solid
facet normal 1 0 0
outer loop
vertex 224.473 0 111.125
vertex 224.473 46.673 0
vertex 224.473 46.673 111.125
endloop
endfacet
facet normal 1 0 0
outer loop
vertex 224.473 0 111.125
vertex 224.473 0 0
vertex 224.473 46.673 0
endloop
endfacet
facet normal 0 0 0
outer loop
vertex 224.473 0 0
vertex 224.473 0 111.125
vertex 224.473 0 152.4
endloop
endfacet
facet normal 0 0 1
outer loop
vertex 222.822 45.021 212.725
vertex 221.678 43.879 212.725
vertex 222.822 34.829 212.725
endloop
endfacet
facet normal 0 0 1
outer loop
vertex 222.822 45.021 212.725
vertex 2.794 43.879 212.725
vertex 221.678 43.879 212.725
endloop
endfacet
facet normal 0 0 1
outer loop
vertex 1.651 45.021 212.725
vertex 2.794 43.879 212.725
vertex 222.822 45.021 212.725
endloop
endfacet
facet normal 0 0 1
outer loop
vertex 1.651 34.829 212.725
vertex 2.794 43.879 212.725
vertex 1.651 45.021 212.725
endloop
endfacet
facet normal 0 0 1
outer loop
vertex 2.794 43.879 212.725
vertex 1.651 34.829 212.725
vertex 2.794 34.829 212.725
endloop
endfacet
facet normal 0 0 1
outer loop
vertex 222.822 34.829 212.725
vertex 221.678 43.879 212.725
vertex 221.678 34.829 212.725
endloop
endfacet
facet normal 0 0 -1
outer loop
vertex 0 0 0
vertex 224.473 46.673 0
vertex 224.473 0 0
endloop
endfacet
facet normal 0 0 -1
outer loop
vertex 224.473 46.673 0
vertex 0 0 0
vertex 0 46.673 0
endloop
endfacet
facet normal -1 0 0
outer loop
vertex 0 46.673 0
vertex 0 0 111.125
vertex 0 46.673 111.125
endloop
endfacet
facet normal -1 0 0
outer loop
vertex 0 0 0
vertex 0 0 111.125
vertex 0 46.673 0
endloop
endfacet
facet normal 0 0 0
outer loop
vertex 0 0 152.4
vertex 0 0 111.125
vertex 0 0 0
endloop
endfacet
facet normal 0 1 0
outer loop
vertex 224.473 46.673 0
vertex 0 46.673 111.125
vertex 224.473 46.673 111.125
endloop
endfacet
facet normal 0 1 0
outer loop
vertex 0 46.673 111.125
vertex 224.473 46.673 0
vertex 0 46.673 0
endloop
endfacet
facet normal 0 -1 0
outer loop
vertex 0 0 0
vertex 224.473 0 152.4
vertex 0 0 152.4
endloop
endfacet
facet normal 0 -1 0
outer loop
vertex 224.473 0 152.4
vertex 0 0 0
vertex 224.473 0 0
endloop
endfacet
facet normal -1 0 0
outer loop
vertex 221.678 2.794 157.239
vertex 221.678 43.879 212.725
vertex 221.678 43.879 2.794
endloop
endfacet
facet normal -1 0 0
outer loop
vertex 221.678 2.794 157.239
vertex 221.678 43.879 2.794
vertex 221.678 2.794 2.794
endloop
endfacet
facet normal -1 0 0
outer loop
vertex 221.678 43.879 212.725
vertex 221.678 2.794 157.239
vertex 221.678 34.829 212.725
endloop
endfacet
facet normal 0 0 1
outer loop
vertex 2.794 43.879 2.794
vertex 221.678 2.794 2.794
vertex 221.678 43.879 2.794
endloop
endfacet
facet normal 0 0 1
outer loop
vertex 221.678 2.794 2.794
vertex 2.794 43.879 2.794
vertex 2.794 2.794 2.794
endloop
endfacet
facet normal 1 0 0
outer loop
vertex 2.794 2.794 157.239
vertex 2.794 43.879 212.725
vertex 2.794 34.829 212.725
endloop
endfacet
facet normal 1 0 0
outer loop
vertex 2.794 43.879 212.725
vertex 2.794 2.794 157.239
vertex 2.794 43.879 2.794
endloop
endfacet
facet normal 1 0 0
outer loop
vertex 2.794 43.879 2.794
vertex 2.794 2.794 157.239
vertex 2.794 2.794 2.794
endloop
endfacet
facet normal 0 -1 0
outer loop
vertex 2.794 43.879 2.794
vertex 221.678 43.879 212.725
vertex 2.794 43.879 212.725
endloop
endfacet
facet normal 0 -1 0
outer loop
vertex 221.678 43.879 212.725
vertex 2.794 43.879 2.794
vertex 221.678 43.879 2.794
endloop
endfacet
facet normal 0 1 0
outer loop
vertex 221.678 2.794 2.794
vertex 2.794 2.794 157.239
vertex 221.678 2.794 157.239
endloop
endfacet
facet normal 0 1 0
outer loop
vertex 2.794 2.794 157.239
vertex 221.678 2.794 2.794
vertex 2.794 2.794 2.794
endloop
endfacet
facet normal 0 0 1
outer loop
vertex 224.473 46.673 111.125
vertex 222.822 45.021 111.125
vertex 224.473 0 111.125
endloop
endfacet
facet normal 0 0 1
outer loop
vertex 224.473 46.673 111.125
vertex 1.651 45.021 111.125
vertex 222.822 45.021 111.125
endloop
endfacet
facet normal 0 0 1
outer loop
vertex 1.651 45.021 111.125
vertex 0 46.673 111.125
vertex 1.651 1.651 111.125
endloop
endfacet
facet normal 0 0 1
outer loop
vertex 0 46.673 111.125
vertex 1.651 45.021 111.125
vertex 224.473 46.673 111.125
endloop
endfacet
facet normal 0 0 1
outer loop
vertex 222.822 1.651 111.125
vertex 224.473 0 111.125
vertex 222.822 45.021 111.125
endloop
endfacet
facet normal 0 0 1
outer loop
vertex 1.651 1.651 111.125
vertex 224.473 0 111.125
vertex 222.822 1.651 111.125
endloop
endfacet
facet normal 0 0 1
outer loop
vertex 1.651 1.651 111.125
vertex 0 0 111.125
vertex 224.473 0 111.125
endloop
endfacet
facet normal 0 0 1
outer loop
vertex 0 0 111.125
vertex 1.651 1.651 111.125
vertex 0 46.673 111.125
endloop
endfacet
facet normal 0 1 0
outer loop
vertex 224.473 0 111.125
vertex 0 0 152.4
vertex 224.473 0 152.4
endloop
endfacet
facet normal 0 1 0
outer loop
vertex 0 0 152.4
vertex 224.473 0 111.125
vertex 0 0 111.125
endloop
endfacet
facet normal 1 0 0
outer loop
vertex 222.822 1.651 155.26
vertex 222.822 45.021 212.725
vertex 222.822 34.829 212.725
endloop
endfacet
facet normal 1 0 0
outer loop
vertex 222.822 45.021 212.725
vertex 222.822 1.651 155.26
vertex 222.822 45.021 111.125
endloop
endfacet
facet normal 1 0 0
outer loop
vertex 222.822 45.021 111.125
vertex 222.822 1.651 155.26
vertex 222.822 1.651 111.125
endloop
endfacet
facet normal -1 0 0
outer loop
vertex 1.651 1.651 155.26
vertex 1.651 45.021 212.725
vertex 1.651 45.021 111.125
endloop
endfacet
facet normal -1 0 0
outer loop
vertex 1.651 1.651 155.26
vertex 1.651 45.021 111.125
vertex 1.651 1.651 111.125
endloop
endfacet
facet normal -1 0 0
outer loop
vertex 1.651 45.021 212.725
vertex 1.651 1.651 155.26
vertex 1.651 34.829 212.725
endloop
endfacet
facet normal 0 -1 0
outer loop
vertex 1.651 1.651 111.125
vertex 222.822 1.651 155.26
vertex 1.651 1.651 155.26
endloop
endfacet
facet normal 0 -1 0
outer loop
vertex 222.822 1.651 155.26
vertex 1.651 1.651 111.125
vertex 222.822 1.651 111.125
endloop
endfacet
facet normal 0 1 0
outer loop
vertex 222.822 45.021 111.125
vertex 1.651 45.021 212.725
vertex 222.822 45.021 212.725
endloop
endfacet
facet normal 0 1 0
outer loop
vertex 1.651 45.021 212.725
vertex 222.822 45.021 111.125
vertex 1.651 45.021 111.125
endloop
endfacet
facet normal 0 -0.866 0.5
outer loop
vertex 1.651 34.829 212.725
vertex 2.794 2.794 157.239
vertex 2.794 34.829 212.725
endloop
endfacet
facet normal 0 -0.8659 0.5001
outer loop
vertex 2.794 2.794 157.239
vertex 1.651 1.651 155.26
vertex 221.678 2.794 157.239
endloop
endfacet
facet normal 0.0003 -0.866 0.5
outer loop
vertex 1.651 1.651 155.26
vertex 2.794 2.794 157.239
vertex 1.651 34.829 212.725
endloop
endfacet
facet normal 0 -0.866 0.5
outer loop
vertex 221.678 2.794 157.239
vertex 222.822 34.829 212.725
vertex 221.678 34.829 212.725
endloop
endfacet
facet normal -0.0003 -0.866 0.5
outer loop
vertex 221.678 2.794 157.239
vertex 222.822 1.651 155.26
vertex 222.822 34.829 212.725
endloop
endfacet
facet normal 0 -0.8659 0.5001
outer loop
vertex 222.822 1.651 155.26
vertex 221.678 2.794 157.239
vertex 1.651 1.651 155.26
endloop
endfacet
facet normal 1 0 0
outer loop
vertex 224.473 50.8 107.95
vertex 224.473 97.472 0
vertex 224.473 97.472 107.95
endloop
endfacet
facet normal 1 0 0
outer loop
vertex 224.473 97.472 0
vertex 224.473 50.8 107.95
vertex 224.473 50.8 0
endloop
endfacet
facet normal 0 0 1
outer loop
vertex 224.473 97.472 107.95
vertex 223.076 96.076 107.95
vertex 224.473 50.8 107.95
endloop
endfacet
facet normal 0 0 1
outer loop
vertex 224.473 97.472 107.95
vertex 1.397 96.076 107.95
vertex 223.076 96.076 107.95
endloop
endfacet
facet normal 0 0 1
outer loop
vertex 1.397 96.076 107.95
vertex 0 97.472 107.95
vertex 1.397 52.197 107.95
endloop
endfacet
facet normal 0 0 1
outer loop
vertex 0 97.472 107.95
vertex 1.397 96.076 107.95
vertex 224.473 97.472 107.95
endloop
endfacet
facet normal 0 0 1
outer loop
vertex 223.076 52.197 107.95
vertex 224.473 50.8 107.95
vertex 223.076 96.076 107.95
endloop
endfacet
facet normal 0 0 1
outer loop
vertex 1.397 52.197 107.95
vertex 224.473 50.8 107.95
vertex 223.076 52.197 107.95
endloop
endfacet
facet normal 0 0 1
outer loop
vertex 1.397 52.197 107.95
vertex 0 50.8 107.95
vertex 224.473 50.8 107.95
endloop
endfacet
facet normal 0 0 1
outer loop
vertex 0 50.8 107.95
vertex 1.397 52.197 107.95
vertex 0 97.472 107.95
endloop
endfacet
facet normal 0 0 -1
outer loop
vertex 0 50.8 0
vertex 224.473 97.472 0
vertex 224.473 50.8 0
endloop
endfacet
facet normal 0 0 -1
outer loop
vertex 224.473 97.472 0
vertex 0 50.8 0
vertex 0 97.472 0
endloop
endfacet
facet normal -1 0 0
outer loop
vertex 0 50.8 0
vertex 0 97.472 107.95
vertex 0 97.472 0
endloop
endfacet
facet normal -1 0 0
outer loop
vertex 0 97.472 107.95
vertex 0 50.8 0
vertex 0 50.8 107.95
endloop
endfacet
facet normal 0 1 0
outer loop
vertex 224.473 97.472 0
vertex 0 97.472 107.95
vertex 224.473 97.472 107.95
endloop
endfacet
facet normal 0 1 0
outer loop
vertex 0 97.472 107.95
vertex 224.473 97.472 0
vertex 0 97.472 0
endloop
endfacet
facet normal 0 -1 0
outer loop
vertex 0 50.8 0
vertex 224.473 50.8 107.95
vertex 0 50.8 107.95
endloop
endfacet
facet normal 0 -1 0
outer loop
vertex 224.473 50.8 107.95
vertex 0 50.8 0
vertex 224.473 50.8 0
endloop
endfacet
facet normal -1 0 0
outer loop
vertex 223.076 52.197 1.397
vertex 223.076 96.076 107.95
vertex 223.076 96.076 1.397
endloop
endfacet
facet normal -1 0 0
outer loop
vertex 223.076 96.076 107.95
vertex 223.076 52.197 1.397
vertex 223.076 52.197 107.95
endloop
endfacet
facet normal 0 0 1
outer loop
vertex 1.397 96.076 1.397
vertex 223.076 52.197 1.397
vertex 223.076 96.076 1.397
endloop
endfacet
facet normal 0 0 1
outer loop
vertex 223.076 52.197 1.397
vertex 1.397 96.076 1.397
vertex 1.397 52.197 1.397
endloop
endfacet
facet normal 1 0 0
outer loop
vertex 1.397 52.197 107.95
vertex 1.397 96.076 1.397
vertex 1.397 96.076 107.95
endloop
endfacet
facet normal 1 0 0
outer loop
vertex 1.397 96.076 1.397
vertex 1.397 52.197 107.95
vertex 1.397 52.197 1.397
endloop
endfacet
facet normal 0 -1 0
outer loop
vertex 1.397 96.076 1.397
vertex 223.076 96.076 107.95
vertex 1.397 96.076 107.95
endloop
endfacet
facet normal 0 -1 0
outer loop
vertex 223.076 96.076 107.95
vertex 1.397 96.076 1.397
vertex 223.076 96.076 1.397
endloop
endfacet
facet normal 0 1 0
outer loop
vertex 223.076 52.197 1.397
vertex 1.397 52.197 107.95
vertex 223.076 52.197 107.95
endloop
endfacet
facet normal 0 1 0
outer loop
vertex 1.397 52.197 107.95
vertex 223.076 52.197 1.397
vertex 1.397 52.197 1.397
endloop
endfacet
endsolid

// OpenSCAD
//
// Make a box suitable for floppy storage.

inch = 25.4; // mm
$fn = 24;
height = (8 + 5/8)*inch;
length = 8.8375*inch;
width = 1.8375*inch;
wall = 0.055*inch;
lheight = 4.25*inch;
rheight = (8 + 3/8)*inch;
fheight = 6*inch;
slack = 0.01*inch;

module box (height, length, width, wall) {
    difference () {
        cube ([length, width, height]);
        translate ([wall, wall, wall])
            cube ([length-wall*2, width-wall*2, height]);

    }
}

difference () {
    box(rheight, length, width, wall*2);
    translate([0, width, height])
        rotate([180, 0, 0])
            box(lheight, length, width, wall+slack);
    translate ([0, 0, fheight])
        rotate([60, 0, 0])
            cube([length, 2*width, lheight]);
}


module lid() {
    box(lheight, length, width, wall);
}

translate ([0, 2*inch, 0])
lid();
